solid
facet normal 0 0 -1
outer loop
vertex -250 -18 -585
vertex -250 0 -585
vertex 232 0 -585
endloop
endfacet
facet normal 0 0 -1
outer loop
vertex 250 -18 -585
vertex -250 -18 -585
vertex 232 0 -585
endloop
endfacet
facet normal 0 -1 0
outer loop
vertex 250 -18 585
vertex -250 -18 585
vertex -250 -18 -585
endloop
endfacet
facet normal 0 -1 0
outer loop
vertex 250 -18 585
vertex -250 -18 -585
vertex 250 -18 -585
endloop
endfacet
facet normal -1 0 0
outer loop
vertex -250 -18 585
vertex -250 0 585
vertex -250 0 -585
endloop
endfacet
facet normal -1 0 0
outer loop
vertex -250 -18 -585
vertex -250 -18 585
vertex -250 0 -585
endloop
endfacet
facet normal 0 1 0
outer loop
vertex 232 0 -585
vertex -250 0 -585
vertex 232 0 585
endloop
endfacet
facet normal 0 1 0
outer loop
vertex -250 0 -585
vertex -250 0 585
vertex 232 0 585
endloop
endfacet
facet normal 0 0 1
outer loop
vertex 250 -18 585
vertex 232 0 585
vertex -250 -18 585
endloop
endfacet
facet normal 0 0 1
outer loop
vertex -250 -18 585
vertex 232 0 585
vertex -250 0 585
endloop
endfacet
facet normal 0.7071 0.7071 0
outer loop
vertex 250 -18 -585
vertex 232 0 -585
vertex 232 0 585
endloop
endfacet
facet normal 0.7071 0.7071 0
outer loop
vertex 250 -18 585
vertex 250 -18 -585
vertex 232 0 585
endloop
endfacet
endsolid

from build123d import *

# Parameters (mm, degrees)
F1_DEPTH = 18
F2_SIZE  = 17.99999


# Not quite as in the source:
# - a fillet or chamfer is up to 0.001 mm smaller than in the source, because OpenCascade refuses the exact size


with BuildPart() as f1:
    # F0 (on Front) → F1 (new body)
    with BuildSketch(Plane.XZ):
        Polygon((0, 0), (-250, 585), (-250, -585), align=None)
        Polygon((250, 585), (-250, 585), (0, 0), align=None)
        Polygon((250, -585), (250, 585), (0, 0), align=None)
        Polygon((0, 0), (-250, -585), (250, -585), align=None)
    extrude(amount=F1_DEPTH)

    # F2 (size 18 in the source; OpenCascade refuses exactly that, so slightly less here)
    f2_edges = [f1.edges().sort_by_distance(p)[0] for p in [
        (250, 0, 0),
    ]]
    chamfer(f2_edges, length=F2_SIZE)


solid = f1.part
